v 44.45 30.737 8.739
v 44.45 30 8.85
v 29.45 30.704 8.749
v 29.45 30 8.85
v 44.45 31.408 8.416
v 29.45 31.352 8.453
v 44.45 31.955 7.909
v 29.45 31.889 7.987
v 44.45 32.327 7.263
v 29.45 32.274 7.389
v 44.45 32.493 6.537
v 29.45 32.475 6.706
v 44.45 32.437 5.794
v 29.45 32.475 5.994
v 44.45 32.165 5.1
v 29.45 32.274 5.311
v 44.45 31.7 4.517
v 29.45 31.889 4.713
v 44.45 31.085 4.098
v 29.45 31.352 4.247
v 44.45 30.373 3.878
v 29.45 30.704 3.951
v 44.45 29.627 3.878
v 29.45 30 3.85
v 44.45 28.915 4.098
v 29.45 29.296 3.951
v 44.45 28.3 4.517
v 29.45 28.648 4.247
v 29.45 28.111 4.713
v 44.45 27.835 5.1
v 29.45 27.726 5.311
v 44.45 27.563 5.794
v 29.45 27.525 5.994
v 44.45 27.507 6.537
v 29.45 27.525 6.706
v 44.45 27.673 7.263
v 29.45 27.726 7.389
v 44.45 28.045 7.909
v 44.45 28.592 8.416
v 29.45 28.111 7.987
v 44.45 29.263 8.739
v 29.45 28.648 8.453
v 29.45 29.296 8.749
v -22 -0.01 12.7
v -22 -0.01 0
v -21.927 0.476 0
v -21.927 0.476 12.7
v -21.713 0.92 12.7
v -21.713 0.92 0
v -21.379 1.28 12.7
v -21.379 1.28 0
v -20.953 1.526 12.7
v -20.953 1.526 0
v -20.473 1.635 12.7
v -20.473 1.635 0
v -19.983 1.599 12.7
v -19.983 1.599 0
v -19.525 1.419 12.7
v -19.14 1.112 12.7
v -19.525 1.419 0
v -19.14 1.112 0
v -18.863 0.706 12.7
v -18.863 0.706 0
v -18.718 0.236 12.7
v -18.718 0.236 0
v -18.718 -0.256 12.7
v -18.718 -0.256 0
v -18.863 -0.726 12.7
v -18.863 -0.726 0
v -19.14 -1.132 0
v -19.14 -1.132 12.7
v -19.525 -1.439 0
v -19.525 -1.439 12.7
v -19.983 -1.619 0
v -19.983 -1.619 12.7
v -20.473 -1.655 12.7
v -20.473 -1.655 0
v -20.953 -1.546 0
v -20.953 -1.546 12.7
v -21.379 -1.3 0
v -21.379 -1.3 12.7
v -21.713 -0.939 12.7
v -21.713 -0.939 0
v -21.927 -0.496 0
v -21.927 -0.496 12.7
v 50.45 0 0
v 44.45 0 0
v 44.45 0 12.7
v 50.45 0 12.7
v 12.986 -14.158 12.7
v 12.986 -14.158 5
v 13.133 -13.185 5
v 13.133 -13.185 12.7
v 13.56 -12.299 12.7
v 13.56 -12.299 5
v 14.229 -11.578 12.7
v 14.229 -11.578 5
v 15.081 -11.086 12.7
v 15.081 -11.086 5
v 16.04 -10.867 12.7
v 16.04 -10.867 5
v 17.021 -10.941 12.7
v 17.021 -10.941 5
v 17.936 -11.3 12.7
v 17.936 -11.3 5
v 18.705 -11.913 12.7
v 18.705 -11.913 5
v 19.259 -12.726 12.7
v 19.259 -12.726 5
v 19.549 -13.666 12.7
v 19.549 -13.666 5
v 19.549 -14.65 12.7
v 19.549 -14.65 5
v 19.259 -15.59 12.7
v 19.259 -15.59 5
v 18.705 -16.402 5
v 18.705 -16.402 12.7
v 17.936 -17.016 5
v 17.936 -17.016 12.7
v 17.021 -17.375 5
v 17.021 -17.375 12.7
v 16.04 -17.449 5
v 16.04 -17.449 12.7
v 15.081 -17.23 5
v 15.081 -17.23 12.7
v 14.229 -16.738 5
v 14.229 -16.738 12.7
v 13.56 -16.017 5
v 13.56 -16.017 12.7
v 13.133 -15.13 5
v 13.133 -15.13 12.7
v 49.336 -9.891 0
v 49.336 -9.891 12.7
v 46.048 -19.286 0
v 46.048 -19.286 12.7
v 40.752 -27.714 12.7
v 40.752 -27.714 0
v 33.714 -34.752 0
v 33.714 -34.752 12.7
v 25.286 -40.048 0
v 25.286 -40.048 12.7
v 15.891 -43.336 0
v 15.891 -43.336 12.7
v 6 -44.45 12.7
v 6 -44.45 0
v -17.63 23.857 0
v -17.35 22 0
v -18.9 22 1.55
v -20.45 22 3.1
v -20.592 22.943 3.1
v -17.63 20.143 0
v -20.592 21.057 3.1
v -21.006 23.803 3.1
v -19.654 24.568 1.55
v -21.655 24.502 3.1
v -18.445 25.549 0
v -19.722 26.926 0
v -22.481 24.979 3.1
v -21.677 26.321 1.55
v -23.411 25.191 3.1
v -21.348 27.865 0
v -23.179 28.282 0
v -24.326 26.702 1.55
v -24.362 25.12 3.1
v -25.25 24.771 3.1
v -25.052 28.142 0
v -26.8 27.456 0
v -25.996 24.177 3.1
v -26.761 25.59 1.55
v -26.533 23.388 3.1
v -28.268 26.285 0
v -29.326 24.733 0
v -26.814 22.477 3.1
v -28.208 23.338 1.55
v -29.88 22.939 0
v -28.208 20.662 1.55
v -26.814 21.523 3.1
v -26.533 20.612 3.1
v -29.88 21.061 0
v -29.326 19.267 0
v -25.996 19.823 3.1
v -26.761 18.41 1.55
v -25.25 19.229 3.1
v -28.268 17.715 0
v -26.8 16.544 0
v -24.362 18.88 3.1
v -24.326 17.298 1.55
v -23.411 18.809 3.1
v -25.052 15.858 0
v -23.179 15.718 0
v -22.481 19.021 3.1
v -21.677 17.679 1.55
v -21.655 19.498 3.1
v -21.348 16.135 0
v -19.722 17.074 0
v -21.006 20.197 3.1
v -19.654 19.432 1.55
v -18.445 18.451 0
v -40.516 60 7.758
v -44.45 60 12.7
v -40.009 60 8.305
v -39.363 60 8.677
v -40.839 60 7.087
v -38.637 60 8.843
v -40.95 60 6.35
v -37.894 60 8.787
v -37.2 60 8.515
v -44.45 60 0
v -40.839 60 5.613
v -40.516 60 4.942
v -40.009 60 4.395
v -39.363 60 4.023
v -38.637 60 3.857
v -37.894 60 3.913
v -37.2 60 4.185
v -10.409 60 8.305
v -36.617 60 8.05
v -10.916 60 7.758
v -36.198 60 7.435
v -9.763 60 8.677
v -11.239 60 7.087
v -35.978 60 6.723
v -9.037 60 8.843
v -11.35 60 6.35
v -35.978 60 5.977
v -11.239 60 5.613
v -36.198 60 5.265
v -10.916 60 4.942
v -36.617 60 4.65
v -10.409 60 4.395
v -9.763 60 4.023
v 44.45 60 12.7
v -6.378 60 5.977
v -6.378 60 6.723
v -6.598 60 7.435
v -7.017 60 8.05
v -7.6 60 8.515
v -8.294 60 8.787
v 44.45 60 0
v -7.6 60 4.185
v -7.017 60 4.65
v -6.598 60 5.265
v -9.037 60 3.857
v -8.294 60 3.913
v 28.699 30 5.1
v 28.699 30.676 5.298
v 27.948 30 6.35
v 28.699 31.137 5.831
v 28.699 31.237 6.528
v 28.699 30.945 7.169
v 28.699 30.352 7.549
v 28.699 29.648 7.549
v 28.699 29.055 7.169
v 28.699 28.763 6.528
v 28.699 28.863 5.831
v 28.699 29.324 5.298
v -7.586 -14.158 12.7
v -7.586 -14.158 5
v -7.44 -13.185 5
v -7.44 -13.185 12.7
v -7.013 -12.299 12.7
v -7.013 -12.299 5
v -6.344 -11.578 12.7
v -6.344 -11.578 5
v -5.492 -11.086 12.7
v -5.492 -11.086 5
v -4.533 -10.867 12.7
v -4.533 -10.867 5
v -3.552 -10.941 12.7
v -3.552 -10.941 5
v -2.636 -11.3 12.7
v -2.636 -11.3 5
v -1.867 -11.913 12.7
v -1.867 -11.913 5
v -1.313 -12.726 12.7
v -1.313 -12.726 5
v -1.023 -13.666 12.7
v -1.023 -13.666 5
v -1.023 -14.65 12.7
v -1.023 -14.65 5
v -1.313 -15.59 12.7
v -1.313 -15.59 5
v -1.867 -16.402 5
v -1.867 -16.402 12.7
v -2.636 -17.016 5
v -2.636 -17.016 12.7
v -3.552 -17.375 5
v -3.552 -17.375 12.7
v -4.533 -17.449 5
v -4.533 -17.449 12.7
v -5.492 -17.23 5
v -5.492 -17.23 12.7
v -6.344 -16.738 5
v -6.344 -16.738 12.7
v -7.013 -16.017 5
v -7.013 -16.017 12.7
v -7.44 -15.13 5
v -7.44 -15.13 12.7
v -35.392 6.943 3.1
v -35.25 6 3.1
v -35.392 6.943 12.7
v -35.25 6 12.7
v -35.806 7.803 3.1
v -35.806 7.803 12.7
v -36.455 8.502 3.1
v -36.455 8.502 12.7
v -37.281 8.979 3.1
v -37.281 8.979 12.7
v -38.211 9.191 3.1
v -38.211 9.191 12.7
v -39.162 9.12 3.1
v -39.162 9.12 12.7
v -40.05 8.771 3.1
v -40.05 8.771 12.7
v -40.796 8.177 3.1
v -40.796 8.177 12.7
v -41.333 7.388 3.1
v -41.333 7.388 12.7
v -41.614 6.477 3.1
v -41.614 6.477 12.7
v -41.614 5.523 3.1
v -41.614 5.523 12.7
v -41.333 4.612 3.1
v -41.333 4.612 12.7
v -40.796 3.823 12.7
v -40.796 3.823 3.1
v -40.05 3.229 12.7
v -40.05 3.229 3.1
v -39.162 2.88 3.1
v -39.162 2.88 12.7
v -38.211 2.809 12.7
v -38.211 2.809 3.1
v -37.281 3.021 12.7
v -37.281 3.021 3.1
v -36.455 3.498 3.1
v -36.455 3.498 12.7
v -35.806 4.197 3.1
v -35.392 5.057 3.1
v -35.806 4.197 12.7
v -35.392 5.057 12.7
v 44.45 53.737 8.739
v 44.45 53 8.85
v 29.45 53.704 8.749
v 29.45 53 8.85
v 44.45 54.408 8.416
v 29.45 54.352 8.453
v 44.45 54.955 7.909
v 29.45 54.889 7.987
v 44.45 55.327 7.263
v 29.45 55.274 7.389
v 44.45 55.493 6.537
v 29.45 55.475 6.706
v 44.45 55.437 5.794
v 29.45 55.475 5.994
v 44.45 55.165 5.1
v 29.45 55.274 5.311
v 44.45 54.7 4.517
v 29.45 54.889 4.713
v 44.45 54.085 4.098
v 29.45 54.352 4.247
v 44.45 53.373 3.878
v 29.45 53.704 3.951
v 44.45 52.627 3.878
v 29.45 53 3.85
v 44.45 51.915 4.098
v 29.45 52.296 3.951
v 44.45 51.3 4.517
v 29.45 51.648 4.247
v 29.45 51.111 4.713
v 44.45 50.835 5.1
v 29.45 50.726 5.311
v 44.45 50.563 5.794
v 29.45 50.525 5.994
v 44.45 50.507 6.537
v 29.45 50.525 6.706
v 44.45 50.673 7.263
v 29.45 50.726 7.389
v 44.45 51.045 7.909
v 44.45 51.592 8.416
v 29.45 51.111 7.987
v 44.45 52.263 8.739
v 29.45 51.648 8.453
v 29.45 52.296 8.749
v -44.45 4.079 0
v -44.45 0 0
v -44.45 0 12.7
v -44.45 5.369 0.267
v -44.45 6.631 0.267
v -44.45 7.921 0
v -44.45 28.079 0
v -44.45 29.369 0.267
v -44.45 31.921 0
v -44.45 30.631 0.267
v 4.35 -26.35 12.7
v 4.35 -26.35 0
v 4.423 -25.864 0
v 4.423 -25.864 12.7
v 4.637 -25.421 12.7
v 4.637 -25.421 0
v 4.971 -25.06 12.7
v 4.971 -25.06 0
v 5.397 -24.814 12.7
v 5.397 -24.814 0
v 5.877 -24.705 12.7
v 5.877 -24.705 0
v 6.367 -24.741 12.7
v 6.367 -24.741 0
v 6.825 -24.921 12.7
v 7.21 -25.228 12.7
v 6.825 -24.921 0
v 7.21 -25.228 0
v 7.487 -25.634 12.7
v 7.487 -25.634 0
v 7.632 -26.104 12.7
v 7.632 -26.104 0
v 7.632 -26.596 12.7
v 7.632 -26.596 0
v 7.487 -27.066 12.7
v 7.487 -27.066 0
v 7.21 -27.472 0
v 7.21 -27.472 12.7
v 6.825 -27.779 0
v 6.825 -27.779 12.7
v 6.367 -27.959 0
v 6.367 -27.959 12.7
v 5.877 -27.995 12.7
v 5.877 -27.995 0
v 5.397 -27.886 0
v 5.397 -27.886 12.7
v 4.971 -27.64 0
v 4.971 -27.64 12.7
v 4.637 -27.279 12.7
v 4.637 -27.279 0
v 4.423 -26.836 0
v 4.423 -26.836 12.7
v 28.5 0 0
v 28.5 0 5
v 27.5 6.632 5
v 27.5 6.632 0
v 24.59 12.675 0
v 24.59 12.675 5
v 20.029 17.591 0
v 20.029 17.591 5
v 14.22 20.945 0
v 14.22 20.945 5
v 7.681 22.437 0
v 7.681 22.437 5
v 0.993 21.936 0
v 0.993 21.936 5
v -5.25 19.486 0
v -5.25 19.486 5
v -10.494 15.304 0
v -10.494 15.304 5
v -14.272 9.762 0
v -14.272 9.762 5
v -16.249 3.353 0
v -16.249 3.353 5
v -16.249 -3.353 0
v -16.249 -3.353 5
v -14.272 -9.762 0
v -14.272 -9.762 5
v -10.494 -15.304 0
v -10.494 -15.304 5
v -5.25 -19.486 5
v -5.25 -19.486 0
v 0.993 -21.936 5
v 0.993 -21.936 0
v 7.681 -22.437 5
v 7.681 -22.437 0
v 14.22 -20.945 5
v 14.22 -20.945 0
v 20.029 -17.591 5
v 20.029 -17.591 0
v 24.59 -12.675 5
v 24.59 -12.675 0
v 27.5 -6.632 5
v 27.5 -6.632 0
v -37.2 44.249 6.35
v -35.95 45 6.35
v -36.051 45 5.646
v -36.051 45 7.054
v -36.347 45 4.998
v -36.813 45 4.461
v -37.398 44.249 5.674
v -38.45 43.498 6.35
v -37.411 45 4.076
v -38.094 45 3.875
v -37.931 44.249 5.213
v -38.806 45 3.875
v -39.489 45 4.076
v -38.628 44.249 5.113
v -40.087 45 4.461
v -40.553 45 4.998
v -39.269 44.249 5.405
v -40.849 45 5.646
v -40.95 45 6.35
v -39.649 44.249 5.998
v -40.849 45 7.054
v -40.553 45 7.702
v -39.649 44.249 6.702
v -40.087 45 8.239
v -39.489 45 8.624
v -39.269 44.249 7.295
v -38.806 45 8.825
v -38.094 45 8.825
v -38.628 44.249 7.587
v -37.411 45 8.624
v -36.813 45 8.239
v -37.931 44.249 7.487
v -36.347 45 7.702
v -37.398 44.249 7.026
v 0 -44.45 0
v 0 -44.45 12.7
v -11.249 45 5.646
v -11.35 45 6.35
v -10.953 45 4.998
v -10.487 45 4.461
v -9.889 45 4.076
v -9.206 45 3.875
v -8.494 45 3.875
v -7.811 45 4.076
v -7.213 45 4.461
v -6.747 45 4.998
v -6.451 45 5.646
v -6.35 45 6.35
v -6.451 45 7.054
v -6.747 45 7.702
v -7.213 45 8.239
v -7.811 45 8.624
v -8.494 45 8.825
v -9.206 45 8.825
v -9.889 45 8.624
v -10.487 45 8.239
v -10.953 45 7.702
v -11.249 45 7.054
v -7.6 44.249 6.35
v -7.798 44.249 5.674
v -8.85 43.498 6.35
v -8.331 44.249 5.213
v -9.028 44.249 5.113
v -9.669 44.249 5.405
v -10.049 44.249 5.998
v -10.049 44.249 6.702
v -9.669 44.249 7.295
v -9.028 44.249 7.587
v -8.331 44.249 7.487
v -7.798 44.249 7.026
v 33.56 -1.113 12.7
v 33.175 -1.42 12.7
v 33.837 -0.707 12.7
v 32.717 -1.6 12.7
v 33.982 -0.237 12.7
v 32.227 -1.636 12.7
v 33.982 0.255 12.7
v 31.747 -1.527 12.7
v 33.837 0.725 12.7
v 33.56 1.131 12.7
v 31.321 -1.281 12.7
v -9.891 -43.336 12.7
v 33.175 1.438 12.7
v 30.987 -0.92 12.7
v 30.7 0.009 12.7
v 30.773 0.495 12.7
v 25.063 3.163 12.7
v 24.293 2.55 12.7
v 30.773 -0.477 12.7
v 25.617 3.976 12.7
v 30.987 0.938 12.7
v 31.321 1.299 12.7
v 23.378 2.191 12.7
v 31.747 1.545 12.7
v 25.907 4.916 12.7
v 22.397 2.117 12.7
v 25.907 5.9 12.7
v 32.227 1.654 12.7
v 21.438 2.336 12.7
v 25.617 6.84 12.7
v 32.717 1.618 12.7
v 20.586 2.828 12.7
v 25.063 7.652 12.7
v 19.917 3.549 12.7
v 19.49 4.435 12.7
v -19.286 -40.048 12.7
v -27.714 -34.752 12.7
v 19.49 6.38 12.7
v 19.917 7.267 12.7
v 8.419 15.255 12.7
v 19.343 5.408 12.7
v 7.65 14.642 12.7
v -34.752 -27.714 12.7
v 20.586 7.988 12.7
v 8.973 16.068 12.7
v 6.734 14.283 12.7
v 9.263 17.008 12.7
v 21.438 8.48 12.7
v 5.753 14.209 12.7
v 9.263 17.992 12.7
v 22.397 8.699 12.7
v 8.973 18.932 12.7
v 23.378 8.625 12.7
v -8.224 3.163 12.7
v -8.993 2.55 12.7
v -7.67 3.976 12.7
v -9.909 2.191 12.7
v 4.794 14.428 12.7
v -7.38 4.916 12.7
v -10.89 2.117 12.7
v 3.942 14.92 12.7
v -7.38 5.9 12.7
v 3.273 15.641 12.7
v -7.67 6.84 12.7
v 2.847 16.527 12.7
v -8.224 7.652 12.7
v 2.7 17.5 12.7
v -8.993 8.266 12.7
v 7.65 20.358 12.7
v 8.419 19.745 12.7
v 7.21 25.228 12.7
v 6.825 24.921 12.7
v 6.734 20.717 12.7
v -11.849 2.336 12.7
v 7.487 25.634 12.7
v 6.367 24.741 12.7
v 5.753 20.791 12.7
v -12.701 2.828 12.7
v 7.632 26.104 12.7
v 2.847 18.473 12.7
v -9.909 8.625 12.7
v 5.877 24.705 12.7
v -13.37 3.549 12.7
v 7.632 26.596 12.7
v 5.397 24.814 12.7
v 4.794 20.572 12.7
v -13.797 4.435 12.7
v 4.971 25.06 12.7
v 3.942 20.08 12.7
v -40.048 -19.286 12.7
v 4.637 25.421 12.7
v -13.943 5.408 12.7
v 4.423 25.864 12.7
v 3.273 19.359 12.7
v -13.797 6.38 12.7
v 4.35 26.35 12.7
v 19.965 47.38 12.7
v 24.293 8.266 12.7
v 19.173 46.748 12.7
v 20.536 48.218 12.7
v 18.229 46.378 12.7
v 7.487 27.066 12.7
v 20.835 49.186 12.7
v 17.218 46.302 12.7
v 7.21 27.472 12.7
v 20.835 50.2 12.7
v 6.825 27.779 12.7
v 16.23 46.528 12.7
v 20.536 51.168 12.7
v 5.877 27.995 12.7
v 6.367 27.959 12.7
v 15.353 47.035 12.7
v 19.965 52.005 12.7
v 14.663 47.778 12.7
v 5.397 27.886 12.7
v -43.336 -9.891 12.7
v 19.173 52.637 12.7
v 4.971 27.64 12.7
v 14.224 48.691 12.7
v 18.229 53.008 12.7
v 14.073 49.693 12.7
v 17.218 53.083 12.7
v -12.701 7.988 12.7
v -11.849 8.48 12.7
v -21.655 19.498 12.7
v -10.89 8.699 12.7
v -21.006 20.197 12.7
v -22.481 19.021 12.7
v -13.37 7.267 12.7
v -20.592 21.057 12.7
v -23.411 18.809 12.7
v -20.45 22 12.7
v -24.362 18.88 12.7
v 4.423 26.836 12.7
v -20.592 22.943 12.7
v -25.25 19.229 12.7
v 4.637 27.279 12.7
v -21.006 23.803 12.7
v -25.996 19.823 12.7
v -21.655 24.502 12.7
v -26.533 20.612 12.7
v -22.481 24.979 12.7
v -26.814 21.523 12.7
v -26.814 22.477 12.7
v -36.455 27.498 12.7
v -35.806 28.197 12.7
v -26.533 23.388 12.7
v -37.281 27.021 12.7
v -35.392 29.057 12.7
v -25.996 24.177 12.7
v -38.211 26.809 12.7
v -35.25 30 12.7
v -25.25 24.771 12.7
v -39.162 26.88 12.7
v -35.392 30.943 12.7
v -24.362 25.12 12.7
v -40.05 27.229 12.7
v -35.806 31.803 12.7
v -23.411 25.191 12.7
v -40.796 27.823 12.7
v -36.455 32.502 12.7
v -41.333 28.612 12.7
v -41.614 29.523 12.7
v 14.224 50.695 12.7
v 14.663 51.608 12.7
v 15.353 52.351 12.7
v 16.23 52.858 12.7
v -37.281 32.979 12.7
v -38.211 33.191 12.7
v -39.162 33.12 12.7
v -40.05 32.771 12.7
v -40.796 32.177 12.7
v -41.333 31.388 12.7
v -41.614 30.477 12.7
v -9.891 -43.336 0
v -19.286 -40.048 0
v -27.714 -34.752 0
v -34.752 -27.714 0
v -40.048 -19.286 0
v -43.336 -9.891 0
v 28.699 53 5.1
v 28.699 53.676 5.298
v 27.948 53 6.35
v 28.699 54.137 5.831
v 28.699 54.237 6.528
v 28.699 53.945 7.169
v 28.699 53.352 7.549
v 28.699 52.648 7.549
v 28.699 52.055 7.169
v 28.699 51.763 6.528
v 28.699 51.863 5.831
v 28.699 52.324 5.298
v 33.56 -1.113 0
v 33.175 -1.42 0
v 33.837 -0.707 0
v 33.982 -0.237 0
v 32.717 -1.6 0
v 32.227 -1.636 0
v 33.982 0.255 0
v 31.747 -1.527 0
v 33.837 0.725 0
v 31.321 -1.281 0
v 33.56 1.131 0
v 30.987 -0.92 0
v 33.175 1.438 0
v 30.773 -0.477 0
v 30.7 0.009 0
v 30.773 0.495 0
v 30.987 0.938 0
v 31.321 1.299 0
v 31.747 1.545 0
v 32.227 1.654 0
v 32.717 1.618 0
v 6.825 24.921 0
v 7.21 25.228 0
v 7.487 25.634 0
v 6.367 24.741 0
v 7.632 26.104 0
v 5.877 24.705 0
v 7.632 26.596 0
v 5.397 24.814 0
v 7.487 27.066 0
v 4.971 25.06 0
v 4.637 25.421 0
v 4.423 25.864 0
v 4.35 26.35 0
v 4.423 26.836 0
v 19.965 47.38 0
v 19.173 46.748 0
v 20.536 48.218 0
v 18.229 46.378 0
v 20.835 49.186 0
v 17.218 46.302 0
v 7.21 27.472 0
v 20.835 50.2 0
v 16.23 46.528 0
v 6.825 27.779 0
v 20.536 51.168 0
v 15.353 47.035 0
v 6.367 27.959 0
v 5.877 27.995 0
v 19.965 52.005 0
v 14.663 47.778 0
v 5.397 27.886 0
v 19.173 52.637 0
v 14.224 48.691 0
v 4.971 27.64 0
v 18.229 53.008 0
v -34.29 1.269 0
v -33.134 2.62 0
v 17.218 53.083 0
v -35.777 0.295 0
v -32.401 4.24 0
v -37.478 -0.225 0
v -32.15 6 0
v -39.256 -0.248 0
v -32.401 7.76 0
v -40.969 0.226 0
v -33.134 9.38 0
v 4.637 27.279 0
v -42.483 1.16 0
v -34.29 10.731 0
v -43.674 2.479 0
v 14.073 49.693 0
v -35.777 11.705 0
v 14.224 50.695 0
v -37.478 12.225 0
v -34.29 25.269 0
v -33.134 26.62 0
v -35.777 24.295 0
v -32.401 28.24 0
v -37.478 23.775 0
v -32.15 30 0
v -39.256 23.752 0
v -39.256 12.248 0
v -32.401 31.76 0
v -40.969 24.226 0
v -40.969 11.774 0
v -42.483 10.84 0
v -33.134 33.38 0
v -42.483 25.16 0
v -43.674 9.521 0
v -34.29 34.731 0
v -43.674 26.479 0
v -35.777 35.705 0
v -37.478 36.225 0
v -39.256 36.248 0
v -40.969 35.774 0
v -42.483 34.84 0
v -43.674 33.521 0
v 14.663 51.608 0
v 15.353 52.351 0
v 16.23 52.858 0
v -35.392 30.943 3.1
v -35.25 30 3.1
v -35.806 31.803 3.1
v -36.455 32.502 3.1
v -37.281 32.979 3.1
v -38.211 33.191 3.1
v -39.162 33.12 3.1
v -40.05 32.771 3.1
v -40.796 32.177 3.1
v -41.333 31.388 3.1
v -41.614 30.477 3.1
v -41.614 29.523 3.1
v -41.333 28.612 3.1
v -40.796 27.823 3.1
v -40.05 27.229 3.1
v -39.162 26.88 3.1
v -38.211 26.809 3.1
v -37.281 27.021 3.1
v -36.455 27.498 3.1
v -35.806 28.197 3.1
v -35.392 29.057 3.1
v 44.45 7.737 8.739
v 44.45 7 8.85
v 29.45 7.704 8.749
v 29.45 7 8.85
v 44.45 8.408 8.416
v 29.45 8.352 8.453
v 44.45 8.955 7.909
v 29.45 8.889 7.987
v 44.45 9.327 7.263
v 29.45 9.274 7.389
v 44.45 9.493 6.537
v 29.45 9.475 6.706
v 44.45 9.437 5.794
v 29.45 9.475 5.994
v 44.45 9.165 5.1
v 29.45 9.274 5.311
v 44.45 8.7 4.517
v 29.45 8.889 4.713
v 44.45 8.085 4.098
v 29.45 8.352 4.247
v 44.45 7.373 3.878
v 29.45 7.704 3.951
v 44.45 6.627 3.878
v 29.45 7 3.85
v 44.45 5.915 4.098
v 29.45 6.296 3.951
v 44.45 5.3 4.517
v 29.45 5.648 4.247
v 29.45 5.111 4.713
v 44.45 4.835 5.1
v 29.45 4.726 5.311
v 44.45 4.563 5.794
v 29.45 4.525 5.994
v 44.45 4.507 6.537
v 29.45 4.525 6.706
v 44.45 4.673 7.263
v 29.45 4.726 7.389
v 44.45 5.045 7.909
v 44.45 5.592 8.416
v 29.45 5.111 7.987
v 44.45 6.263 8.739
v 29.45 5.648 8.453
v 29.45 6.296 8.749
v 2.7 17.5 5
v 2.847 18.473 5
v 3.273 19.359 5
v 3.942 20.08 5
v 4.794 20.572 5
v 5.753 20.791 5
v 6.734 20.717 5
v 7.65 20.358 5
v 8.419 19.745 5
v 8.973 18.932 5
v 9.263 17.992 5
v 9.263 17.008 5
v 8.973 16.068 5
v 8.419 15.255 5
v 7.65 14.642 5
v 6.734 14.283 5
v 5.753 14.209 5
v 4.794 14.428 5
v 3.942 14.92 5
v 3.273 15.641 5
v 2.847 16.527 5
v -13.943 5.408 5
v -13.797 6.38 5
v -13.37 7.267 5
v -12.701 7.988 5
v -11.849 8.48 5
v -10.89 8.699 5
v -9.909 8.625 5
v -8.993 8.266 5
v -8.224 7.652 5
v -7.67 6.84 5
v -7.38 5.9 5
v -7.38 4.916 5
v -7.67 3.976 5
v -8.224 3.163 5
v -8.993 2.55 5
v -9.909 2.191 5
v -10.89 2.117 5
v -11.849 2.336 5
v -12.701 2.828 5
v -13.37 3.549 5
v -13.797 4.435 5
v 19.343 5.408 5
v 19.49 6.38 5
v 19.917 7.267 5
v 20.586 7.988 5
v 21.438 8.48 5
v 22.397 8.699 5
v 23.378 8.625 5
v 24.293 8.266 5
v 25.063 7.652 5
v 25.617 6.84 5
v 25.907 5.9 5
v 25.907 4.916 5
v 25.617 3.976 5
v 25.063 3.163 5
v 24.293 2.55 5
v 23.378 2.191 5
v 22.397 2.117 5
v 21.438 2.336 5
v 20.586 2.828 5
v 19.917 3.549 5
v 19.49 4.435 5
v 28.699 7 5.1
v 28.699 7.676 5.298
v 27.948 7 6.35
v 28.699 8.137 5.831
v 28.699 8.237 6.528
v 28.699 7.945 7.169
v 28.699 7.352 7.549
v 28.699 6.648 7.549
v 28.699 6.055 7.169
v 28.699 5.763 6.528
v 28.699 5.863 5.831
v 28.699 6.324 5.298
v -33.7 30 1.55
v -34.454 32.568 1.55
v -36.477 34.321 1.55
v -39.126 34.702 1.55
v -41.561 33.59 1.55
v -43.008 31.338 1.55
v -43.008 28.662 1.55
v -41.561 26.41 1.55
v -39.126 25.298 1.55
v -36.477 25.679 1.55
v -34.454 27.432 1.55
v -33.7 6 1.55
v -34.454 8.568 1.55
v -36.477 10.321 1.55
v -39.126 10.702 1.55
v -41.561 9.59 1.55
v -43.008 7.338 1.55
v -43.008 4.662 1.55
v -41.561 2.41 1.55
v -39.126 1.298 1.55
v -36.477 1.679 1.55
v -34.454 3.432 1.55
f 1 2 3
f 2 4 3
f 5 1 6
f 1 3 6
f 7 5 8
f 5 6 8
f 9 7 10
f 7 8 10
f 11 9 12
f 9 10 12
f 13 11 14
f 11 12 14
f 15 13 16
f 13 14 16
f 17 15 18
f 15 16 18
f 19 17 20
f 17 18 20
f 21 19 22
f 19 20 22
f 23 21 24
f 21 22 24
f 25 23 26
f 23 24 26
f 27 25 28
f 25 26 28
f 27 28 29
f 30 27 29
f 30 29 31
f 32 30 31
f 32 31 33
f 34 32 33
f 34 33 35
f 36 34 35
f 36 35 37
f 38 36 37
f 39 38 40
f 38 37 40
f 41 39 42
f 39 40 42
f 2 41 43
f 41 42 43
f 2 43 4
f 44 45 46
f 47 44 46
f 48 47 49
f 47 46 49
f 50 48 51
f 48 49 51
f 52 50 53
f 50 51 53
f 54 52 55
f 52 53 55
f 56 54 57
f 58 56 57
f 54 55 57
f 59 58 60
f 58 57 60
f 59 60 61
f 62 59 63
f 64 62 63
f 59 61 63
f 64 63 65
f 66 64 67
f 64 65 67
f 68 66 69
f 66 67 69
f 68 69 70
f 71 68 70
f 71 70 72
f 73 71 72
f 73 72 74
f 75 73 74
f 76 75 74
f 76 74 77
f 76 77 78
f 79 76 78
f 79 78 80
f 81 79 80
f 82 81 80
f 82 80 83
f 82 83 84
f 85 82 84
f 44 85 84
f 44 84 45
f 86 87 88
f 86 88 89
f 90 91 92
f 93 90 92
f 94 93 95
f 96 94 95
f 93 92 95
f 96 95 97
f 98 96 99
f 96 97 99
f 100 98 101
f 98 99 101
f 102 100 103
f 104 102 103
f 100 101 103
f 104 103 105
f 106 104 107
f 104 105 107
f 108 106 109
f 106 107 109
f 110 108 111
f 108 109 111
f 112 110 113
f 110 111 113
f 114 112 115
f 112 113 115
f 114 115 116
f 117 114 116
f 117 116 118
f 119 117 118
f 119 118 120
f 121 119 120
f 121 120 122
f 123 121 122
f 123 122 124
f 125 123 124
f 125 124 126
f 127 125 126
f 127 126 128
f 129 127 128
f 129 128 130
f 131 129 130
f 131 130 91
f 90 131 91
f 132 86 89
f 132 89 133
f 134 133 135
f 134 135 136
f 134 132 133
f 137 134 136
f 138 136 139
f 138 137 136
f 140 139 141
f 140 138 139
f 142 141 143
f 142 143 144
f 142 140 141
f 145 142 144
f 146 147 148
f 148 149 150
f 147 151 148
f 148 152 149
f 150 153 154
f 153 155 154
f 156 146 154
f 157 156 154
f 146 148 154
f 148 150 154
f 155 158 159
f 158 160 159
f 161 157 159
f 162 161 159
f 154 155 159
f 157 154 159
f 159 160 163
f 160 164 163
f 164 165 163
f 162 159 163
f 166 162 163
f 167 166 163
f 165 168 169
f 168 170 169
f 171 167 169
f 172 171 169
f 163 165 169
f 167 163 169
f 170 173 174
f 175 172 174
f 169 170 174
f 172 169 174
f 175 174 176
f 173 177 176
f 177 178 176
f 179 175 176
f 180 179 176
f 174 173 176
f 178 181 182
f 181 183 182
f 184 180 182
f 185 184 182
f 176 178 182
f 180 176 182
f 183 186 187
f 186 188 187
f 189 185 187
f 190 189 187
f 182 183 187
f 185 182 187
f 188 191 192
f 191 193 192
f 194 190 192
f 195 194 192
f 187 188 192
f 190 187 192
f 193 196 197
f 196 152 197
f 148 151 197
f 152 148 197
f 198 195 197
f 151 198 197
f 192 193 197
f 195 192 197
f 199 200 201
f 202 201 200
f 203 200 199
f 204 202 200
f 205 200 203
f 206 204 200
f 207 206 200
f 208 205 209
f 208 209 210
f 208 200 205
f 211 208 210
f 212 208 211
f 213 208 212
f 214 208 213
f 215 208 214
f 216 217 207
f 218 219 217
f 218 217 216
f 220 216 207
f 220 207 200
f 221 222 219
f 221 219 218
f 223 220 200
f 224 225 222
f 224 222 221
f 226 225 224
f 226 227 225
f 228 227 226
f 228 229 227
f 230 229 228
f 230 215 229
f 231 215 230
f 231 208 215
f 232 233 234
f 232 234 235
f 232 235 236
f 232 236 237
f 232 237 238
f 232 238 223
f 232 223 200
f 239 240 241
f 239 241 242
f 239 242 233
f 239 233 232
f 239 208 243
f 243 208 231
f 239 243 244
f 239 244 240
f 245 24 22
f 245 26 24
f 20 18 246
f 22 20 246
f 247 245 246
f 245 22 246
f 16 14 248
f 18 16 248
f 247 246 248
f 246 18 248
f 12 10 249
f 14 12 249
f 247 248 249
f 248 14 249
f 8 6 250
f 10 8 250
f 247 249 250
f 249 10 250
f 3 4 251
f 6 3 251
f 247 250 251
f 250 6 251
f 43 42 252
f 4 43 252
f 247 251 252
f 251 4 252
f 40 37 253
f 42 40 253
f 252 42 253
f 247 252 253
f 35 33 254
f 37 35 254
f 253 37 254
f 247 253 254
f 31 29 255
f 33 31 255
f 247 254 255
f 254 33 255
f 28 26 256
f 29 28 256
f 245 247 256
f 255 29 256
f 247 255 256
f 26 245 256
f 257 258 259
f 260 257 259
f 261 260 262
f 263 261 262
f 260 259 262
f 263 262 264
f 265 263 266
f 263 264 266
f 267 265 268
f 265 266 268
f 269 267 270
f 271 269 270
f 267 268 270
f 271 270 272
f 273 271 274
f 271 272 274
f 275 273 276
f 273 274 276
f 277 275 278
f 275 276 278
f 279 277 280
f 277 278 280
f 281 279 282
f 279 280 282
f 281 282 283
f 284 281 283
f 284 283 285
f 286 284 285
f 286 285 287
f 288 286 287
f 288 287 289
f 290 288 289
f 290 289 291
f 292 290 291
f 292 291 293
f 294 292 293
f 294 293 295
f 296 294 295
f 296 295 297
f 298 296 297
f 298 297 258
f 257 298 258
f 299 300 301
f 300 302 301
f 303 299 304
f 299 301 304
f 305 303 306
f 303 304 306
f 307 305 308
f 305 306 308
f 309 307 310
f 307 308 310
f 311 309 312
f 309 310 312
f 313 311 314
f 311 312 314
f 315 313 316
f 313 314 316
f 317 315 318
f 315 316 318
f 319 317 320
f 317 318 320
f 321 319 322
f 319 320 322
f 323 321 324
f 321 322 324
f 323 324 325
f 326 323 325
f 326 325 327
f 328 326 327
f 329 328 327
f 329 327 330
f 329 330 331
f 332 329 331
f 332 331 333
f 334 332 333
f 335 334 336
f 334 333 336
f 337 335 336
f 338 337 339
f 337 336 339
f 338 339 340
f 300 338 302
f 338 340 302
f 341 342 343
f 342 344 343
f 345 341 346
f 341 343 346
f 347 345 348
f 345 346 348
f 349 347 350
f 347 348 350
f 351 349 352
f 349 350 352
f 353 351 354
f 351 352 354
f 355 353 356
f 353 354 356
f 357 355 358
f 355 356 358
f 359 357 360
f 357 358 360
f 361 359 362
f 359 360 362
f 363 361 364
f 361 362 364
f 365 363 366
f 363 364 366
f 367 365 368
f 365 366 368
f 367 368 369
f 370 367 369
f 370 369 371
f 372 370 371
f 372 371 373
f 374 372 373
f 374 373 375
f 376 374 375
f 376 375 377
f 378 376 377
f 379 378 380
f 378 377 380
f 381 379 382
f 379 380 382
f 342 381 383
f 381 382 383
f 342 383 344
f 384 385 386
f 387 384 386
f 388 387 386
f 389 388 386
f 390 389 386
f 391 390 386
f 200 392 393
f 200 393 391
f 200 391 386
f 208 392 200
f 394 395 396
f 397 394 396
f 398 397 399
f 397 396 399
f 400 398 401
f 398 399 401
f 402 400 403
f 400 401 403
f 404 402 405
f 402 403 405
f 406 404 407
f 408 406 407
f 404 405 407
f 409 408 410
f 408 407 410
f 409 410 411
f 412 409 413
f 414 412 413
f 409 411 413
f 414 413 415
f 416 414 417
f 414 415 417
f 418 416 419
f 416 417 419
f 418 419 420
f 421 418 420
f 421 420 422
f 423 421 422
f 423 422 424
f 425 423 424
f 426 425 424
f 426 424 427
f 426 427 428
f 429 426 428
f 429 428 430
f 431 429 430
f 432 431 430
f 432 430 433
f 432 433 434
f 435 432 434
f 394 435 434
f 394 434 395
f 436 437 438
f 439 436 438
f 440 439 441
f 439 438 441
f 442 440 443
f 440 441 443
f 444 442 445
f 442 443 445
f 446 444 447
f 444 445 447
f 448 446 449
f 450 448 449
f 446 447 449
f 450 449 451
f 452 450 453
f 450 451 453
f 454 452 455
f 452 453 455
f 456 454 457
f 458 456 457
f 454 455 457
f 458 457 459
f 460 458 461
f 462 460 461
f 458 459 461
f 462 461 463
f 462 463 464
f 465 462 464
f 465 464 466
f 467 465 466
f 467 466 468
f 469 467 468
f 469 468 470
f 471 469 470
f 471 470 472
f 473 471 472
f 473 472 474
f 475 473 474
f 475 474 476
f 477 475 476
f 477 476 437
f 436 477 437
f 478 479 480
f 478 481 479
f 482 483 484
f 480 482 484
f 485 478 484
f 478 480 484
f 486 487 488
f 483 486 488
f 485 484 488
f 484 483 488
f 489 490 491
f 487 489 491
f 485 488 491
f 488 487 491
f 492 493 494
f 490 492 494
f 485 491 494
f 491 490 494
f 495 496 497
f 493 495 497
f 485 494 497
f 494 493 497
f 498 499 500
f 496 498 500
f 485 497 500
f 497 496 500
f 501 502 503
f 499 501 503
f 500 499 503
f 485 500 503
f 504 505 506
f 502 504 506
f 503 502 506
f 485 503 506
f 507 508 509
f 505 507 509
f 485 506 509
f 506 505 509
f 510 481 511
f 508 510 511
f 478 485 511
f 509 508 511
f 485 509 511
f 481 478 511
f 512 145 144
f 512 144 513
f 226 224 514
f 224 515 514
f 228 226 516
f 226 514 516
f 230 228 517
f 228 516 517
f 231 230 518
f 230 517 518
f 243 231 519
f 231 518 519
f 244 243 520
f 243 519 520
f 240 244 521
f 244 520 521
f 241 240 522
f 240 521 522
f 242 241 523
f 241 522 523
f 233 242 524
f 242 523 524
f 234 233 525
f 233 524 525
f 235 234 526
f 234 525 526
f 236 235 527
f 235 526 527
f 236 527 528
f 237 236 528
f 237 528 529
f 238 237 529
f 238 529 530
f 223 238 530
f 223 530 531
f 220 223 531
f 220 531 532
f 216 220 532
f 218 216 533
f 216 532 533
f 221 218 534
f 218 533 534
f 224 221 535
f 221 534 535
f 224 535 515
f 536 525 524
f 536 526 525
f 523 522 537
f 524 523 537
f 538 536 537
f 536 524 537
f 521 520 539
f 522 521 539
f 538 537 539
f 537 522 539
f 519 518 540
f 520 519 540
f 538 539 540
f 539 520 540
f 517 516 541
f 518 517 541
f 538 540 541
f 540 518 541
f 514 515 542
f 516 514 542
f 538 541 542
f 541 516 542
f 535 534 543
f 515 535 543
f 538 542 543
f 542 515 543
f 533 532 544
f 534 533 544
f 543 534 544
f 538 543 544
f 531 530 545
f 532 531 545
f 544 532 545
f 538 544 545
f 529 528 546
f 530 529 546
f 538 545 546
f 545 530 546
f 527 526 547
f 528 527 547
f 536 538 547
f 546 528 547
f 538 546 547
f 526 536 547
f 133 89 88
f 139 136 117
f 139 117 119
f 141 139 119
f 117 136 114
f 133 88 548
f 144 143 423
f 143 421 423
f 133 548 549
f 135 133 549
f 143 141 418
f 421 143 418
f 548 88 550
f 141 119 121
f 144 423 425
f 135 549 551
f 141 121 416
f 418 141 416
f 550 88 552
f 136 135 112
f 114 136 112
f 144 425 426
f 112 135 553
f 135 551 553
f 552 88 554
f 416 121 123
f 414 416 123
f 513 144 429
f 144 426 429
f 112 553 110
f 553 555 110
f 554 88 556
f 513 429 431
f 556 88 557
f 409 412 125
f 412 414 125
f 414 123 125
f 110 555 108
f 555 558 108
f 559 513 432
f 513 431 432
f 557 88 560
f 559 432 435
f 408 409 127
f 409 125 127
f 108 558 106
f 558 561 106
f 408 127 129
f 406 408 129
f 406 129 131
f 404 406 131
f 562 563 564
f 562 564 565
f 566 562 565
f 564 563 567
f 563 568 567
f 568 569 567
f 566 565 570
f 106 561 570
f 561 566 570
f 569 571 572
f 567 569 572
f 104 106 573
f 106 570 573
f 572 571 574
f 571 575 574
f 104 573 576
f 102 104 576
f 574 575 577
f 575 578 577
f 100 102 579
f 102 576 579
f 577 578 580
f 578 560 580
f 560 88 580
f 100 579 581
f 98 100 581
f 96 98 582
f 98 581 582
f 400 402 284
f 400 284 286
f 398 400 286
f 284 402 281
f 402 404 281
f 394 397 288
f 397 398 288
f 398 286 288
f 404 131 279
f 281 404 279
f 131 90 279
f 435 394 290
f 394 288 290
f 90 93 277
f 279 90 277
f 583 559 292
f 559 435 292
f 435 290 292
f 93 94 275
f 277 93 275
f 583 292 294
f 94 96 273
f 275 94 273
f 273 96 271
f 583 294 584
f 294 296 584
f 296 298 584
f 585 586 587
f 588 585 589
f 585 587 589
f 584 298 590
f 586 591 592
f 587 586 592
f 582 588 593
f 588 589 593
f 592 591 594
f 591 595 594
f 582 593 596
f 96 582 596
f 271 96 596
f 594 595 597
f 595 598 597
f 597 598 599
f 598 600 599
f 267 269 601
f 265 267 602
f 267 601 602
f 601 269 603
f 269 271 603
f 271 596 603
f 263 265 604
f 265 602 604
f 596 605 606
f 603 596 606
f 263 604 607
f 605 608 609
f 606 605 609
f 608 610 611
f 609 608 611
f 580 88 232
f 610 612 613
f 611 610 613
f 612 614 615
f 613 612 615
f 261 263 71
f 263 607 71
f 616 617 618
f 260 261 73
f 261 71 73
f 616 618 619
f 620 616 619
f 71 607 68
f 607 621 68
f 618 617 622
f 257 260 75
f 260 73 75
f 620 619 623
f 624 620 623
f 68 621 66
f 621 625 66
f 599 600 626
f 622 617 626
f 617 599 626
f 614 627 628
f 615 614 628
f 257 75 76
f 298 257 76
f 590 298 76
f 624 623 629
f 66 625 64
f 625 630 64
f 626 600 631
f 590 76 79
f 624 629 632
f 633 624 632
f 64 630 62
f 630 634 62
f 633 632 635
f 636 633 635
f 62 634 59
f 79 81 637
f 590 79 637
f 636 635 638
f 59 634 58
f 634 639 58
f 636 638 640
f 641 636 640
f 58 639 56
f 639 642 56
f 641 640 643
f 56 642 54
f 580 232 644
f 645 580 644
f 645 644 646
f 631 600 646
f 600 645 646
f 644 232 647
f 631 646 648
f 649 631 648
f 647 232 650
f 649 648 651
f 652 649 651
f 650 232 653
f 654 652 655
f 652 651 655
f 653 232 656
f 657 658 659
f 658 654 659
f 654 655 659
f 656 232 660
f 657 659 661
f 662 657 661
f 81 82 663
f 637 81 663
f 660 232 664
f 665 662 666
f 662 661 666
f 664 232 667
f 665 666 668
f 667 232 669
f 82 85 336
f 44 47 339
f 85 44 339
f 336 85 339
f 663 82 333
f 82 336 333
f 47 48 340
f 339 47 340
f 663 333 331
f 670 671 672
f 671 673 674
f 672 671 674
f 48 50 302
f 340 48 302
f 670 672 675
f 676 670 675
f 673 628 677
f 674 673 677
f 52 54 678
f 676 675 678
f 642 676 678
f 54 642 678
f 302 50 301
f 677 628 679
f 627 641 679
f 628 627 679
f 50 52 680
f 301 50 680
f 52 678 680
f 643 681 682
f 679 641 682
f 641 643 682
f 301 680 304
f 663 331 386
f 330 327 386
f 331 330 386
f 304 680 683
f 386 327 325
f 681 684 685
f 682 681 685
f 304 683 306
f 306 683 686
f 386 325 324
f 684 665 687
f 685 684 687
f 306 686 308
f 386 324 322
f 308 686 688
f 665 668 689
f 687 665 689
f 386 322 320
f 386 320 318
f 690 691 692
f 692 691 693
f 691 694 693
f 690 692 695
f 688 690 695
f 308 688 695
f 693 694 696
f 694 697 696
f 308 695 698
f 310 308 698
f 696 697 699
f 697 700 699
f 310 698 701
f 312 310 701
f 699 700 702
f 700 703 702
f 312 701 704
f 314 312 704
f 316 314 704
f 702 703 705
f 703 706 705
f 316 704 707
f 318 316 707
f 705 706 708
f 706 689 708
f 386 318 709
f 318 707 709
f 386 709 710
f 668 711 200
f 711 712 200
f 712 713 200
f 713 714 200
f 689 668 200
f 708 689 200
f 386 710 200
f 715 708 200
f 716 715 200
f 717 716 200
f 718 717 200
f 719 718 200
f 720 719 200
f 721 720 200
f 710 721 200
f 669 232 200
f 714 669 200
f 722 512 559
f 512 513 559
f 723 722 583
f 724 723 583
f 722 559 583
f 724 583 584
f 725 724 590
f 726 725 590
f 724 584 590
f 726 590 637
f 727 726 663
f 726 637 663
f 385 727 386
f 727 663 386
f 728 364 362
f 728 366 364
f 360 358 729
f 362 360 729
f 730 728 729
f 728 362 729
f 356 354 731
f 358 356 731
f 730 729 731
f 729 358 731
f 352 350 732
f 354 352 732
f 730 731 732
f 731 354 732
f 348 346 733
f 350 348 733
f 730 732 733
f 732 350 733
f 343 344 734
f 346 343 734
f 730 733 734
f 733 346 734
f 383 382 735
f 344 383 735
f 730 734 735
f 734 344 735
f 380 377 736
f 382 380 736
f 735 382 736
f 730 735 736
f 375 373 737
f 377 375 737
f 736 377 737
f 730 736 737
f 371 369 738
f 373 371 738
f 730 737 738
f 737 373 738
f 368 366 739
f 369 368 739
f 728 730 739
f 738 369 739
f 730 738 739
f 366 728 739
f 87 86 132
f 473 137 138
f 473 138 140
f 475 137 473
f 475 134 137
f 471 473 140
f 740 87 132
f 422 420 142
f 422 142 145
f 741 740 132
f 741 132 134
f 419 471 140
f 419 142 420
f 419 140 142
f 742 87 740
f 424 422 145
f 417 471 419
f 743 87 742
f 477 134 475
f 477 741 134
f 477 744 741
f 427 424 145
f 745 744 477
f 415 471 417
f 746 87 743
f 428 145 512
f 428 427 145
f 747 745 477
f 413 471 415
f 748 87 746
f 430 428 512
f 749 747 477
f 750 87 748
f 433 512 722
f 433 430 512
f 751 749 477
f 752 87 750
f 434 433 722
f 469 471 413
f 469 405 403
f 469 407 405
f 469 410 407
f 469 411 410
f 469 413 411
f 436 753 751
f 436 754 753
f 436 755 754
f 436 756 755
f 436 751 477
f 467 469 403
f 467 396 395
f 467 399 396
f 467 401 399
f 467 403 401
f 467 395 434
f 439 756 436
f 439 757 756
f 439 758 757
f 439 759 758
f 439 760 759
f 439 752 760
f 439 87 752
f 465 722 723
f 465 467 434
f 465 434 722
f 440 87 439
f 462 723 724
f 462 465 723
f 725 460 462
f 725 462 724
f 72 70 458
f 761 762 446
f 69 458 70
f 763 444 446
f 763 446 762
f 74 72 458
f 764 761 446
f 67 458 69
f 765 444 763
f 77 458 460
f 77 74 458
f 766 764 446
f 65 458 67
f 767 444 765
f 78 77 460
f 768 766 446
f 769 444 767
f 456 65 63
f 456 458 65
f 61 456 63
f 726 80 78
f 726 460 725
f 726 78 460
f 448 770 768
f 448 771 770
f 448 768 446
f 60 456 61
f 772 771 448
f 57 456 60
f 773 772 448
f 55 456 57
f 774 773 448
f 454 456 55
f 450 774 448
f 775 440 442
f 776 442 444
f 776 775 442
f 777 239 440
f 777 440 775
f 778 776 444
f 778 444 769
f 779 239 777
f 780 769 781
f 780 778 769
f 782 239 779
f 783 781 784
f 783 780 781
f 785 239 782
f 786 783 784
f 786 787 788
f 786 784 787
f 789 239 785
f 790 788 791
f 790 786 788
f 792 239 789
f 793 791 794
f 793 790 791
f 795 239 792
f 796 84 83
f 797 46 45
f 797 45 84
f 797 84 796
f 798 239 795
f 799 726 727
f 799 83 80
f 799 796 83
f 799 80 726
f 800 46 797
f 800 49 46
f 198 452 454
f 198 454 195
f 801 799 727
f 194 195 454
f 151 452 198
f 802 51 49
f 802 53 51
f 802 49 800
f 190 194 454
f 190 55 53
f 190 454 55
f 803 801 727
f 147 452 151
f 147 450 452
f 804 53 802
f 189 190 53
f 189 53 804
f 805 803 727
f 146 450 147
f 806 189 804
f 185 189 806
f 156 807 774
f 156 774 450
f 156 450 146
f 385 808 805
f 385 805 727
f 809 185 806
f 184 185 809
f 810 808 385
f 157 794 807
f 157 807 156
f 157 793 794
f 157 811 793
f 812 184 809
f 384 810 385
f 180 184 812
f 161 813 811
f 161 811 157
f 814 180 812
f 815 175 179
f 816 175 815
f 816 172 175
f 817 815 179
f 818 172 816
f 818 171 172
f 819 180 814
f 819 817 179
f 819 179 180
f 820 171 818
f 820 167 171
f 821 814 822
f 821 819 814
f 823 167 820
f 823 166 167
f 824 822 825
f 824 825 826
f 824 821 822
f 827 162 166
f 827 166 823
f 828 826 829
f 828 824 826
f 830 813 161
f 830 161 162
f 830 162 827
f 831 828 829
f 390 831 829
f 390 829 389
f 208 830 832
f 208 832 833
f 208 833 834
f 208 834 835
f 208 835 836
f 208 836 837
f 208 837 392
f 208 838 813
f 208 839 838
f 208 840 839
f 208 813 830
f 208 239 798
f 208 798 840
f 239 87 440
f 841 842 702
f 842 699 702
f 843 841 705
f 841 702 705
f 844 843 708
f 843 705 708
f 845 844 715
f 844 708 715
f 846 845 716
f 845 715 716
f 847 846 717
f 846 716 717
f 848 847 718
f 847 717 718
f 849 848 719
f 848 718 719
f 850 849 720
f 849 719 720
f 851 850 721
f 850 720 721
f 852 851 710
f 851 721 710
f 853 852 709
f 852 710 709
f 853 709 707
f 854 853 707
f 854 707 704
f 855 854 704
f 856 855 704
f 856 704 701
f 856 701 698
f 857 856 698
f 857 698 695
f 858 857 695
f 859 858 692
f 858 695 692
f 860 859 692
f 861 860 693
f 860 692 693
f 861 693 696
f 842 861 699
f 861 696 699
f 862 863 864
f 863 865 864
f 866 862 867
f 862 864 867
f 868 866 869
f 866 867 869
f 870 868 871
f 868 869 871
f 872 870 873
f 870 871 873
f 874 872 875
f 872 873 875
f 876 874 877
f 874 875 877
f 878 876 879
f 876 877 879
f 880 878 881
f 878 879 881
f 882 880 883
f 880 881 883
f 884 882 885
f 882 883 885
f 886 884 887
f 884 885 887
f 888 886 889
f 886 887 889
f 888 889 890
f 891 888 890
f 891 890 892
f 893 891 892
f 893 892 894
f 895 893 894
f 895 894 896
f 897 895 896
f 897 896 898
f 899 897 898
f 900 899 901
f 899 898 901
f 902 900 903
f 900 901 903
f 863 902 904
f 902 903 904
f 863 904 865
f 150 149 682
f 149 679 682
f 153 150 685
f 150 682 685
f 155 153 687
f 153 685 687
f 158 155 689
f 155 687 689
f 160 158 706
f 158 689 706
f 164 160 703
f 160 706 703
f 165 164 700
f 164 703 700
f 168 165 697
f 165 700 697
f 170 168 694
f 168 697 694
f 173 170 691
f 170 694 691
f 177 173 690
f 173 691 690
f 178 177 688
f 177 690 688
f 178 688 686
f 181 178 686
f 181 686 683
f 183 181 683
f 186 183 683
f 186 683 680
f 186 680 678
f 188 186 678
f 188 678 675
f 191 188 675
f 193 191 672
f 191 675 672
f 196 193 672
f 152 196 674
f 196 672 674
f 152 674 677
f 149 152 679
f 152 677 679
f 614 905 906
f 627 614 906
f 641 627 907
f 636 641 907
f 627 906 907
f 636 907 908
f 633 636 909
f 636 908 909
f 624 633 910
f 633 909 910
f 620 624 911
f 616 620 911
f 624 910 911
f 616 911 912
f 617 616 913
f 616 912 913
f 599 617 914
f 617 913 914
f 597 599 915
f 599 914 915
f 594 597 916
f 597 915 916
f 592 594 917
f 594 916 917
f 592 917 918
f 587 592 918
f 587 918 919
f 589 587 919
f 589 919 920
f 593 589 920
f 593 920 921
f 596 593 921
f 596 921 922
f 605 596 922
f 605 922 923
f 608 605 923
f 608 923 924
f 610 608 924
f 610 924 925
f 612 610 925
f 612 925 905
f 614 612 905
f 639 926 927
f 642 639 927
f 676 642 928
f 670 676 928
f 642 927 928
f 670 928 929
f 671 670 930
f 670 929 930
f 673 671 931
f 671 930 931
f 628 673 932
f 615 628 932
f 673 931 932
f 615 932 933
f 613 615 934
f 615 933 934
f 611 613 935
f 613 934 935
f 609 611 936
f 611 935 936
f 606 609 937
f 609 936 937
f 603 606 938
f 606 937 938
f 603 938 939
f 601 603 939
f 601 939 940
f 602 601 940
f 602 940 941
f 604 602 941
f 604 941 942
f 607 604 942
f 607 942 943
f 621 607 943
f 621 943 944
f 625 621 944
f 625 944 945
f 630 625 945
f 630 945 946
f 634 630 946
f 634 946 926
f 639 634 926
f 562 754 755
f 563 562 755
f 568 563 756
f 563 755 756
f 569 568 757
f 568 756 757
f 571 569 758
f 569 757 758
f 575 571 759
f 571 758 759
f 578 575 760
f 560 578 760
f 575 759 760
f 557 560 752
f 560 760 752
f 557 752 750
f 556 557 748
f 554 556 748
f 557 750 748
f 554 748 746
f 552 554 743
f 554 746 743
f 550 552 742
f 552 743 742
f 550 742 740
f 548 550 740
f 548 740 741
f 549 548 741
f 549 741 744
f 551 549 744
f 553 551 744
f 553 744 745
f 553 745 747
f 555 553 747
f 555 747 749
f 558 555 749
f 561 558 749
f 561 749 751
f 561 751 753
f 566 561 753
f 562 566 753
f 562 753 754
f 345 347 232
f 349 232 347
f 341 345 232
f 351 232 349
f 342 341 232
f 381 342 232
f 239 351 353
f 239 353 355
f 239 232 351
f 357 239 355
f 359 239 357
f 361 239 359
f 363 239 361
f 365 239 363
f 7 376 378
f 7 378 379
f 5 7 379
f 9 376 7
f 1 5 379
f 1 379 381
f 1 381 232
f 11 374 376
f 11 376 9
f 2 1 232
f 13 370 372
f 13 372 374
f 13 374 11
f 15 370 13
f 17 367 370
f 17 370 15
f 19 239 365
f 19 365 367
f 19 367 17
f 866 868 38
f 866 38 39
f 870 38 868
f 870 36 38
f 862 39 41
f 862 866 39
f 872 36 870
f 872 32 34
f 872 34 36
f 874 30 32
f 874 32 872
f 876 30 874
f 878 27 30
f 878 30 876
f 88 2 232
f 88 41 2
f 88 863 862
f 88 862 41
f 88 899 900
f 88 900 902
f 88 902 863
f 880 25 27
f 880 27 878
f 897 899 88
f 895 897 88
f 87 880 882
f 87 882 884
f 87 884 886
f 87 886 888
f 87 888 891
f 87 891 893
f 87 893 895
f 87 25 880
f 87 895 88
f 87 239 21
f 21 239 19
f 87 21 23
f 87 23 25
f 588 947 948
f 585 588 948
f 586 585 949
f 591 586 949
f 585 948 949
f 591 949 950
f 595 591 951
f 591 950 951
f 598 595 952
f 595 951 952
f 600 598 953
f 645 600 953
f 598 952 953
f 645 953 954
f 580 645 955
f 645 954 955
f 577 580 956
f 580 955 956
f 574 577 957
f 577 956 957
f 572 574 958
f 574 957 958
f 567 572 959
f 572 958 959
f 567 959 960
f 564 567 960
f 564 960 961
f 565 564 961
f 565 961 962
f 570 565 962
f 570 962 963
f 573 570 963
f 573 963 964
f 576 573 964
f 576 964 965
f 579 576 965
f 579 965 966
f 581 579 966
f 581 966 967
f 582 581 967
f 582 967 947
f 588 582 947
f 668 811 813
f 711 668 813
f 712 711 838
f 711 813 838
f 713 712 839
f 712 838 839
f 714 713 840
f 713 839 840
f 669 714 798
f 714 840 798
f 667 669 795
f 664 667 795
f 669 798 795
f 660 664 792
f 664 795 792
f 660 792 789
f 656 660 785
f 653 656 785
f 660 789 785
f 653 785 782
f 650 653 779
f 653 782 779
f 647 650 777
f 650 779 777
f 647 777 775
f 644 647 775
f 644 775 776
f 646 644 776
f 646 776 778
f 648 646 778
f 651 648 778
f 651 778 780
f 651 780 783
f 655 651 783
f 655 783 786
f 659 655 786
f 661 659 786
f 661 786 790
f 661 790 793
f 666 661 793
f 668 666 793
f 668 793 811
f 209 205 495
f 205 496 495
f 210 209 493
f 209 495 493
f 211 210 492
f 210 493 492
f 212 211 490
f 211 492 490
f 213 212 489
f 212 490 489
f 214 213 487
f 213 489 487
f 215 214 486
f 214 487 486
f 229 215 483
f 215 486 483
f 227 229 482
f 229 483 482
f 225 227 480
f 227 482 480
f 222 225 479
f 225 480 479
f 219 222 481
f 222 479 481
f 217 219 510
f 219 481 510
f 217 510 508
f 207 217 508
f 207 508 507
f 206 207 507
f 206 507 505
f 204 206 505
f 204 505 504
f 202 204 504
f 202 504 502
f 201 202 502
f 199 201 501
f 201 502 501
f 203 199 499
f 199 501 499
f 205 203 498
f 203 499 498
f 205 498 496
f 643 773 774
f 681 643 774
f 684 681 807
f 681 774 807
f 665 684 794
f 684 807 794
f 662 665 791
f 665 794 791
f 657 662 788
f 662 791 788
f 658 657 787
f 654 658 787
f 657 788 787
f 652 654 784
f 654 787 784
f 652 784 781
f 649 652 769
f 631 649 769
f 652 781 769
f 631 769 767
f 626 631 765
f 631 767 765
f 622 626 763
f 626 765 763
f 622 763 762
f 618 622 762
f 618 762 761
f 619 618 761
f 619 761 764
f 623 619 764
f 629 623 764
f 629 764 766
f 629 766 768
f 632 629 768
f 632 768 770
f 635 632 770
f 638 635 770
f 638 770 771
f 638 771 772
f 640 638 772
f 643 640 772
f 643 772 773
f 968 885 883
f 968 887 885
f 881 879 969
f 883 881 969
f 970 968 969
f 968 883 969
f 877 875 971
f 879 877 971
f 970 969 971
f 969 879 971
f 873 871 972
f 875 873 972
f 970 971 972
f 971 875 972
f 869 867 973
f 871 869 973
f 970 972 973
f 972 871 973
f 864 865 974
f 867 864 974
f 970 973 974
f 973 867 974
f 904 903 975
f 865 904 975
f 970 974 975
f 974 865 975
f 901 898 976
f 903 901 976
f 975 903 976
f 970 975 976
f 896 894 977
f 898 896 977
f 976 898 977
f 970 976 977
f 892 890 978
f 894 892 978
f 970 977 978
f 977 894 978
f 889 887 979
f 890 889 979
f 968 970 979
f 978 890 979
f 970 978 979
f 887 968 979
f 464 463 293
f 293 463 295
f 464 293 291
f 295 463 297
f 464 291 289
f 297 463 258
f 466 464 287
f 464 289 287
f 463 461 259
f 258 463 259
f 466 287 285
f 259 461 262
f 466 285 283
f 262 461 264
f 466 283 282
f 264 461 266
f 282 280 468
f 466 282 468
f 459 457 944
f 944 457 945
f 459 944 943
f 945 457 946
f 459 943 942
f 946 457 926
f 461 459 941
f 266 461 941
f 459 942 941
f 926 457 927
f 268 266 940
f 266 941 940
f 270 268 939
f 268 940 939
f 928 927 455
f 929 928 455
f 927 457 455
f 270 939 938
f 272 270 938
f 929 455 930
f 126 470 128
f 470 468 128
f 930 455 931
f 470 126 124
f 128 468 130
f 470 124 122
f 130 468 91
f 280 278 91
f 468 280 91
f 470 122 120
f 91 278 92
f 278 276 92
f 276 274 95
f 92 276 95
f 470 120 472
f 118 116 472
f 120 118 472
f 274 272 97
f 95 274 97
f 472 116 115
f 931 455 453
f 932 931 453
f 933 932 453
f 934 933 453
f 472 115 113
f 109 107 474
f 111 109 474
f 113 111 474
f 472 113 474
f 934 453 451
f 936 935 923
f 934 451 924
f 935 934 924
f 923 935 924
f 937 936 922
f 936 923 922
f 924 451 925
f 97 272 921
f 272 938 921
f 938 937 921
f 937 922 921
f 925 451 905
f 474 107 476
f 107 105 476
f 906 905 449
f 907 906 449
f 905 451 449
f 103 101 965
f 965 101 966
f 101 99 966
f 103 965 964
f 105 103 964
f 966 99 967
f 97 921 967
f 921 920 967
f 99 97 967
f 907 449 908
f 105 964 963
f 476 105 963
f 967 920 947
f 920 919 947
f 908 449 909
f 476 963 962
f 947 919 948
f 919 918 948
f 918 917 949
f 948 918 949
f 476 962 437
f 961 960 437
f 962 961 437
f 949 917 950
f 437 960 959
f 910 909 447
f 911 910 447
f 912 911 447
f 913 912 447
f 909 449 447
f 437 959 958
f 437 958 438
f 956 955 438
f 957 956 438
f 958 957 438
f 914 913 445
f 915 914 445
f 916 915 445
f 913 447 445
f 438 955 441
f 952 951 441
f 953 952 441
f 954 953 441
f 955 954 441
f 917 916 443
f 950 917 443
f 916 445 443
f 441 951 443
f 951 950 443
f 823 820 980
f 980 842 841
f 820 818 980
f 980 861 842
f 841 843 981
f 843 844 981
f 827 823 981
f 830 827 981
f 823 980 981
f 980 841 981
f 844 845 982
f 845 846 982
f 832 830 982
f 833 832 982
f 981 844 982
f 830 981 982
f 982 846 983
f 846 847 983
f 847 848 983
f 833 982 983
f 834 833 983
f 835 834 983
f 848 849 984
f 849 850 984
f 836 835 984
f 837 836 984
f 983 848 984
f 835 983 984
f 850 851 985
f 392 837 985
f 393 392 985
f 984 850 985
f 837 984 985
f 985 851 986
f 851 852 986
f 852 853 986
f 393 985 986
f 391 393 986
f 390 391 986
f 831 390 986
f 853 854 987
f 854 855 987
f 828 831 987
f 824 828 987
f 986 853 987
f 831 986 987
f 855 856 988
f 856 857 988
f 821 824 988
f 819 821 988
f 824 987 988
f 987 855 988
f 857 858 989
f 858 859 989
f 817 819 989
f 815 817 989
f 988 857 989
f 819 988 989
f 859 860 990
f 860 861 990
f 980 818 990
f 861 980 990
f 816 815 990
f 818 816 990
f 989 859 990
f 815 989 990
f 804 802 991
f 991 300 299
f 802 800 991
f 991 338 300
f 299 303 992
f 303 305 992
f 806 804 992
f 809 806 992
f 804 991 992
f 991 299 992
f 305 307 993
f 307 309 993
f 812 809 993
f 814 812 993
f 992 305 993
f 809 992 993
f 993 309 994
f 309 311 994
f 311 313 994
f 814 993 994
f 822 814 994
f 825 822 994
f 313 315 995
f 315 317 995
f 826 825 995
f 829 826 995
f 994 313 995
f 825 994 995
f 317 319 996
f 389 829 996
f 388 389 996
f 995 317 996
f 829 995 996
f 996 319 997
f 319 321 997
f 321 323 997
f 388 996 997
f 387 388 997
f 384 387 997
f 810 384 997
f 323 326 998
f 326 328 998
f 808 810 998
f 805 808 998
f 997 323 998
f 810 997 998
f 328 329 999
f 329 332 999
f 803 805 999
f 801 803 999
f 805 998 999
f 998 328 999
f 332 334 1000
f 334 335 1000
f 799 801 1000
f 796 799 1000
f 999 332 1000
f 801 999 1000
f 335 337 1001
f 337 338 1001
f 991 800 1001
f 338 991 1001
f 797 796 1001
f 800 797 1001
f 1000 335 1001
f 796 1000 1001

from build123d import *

# Parameters (mm, degrees)
BOSS_EXTRUDE1_DEPTH                             = 12.7
M4X0_7_TAPPED_HOLE1_D                           = 3.3
M8X1_25_TAPPED_HOLE1_D                          = 6.8
CSK_FOR_M6_FLAT_HEAD_MACHINE_SCREW1_D           = 6.4
CSK_FOR_M6_FLAT_HEAD_MACHINE_SCREW1_CSINK_D     = 12.6
CSK_FOR_M6_FLAT_HEAD_MACHINE_SCREW1_CSINK_ANGLE = 90
M6X1_0_TAPPED_HOLE2_D                           = 5
M6X1_0_TAPPED_HOLE2_DEPTH                       = 15
M6X1_0_TAPPED_HOLE2_TIP                         = 1.502151548
M6X1_0_TAPPED_HOLE1_D                           = 5
M6X1_0_TAPPED_HOLE1_DEPTH                       = 15
M6X1_0_TAPPED_HOLE1_TIP                         = 1.502151548
CSK_FOR_M6_FLAT_HEAD_MACHINE_SCREW2_D           = 6.4
CSK_FOR_M6_FLAT_HEAD_MACHINE_SCREW2_CSINK_D     = 12.6
CSK_FOR_M6_FLAT_HEAD_MACHINE_SCREW2_CSINK_ANGLE = 90
F_1_3_4_CLEARANCE_HOLE1_D                       = 45
F_1_3_4_CLEARANCE_HOLE1_DEPTH                   = 5
M6_CLEARANCE_HOLE1_D                            = 6.6
FILLET1_R                                       = 44.45


with BuildPart() as part:
    # Sketch1 → Boss-Extrude1 (new body)
    with BuildSketch(Plane(origin=(0, 0, 0), x_dir=(-1, 0, 0), z_dir=(0, 0, -1))):
        with BuildLine():
            Line((-6, -44.45), (44.45, -44.45))
            Line((44.45, -44.45), (44.45, 60))
            Line((44.45, 60), (-44.45, 60))
            Line((-44.45, 60), (-44.45, 0))
            Line((-44.45, 0), (-50.45, 0))
            ThreePointArc((-50.45, 0), (-37.430896424, -31.430896424), (-6, -44.45))
        make_face()
    extrude(amount=-BOSS_EXTRUDE1_DEPTH)

    # M4x0.7 Tapped Hole1 (through all)
    with Locations(Plane.XY.offset(12.7)):
        with Locations((32.349998458, 0.009014041), (6, -26.35), (-20.349998115, -0.009967087), (6, 26.35)):
            Hole(M4X0_7_TAPPED_HOLE1_D / 2)

    # M8x1.25 Tapped Hole1 (through all)
    with Locations(Plane.XY.offset(12.7)):
        with Locations((17.47250377, 49.692873304)):
            Hole(M8X1_25_TAPPED_HOLE1_D / 2)

    # CSK for M6 Flat Head Machine Screw1 (through all)
    with Locations(Plane(origin=(0, 0, 0), x_dir=(-1, 0, 0), z_dir=(0, 0, -1))):
        with Locations((23.65, 22)):
            CounterSinkHole(CSK_FOR_M6_FLAT_HEAD_MACHINE_SCREW1_D / 2, CSK_FOR_M6_FLAT_HEAD_MACHINE_SCREW1_CSINK_D / 2, counter_sink_angle=CSK_FOR_M6_FLAT_HEAD_MACHINE_SCREW1_CSINK_ANGLE)

    # M6x1.0 Tapped Hole2
    with Locations(Plane(origin=(44.45, 0, 0), x_dir=(0, 0, -1), z_dir=(1, 0, 0))):
        with Locations((-6.35, 7), (-6.35, 53), (-6.35, 30)):
            Hole(M6X1_0_TAPPED_HOLE2_D / 2, depth=M6X1_0_TAPPED_HOLE2_DEPTH)
            with Locations((0, 0, -(M6X1_0_TAPPED_HOLE2_DEPTH + M6X1_0_TAPPED_HOLE2_TIP / 2))):  # 118° drill point
                Cone(0, M6X1_0_TAPPED_HOLE2_D / 2, M6X1_0_TAPPED_HOLE2_TIP, mode=Mode.SUBTRACT)

    # M6x1.0 Tapped Hole1
    with Locations(Plane(origin=(0, 60, 0), x_dir=(1, 0, 0), z_dir=(0, 1, 0))):
        with Locations((-38.45, -6.35), (-8.85, -6.35)):
            Hole(M6X1_0_TAPPED_HOLE1_D / 2, depth=M6X1_0_TAPPED_HOLE1_DEPTH)
            with Locations((0, 0, -(M6X1_0_TAPPED_HOLE1_DEPTH + M6X1_0_TAPPED_HOLE1_TIP / 2))):  # 118° drill point
                Cone(0, M6X1_0_TAPPED_HOLE1_D / 2, M6X1_0_TAPPED_HOLE1_TIP, mode=Mode.SUBTRACT)

    # CSK for M6 Flat Head Machine Screw2 (through all)
    with Locations(Plane(origin=(0, 0, 0), x_dir=(-1, 0, 0), z_dir=(0, 0, -1))):
        with Locations((38.45, 30), (38.45, 6)):
            CounterSinkHole(CSK_FOR_M6_FLAT_HEAD_MACHINE_SCREW2_D / 2, CSK_FOR_M6_FLAT_HEAD_MACHINE_SCREW2_CSINK_D / 2, counter_sink_angle=CSK_FOR_M6_FLAT_HEAD_MACHINE_SCREW2_CSINK_ANGLE)

    # 1-3/4 Clearance Hole1
    with Locations(Plane(origin=(0, 0, 0), x_dir=(-1, 0, 0), z_dir=(0, 0, -1))):
        with Locations((-6, 0)):
            Hole(F_1_3_4_CLEARANCE_HOLE1_D / 2, depth=F_1_3_4_CLEARANCE_HOLE1_DEPTH)

    # M6 Clearance Hole1 (through all)
    with Locations(Plane.XY.offset(12.7)):
        with Locations((6, 17.5), (22.643489035, 5.407797402), (16.286241915, -14.157797402), (-4.286241915, -14.157797402), (-10.643489035, 5.407797402)):
            Hole(M6_CLEARANCE_HOLE1_D / 2)

    # Fillet1
    fillet1_edges = [part.edges().sort_by_distance(p)[0] for p in [
        (-44.45, -44.45, 6.35),
    ]]
    fillet(fillet1_edges, radius=FILLET1_R)


solid = part.part
